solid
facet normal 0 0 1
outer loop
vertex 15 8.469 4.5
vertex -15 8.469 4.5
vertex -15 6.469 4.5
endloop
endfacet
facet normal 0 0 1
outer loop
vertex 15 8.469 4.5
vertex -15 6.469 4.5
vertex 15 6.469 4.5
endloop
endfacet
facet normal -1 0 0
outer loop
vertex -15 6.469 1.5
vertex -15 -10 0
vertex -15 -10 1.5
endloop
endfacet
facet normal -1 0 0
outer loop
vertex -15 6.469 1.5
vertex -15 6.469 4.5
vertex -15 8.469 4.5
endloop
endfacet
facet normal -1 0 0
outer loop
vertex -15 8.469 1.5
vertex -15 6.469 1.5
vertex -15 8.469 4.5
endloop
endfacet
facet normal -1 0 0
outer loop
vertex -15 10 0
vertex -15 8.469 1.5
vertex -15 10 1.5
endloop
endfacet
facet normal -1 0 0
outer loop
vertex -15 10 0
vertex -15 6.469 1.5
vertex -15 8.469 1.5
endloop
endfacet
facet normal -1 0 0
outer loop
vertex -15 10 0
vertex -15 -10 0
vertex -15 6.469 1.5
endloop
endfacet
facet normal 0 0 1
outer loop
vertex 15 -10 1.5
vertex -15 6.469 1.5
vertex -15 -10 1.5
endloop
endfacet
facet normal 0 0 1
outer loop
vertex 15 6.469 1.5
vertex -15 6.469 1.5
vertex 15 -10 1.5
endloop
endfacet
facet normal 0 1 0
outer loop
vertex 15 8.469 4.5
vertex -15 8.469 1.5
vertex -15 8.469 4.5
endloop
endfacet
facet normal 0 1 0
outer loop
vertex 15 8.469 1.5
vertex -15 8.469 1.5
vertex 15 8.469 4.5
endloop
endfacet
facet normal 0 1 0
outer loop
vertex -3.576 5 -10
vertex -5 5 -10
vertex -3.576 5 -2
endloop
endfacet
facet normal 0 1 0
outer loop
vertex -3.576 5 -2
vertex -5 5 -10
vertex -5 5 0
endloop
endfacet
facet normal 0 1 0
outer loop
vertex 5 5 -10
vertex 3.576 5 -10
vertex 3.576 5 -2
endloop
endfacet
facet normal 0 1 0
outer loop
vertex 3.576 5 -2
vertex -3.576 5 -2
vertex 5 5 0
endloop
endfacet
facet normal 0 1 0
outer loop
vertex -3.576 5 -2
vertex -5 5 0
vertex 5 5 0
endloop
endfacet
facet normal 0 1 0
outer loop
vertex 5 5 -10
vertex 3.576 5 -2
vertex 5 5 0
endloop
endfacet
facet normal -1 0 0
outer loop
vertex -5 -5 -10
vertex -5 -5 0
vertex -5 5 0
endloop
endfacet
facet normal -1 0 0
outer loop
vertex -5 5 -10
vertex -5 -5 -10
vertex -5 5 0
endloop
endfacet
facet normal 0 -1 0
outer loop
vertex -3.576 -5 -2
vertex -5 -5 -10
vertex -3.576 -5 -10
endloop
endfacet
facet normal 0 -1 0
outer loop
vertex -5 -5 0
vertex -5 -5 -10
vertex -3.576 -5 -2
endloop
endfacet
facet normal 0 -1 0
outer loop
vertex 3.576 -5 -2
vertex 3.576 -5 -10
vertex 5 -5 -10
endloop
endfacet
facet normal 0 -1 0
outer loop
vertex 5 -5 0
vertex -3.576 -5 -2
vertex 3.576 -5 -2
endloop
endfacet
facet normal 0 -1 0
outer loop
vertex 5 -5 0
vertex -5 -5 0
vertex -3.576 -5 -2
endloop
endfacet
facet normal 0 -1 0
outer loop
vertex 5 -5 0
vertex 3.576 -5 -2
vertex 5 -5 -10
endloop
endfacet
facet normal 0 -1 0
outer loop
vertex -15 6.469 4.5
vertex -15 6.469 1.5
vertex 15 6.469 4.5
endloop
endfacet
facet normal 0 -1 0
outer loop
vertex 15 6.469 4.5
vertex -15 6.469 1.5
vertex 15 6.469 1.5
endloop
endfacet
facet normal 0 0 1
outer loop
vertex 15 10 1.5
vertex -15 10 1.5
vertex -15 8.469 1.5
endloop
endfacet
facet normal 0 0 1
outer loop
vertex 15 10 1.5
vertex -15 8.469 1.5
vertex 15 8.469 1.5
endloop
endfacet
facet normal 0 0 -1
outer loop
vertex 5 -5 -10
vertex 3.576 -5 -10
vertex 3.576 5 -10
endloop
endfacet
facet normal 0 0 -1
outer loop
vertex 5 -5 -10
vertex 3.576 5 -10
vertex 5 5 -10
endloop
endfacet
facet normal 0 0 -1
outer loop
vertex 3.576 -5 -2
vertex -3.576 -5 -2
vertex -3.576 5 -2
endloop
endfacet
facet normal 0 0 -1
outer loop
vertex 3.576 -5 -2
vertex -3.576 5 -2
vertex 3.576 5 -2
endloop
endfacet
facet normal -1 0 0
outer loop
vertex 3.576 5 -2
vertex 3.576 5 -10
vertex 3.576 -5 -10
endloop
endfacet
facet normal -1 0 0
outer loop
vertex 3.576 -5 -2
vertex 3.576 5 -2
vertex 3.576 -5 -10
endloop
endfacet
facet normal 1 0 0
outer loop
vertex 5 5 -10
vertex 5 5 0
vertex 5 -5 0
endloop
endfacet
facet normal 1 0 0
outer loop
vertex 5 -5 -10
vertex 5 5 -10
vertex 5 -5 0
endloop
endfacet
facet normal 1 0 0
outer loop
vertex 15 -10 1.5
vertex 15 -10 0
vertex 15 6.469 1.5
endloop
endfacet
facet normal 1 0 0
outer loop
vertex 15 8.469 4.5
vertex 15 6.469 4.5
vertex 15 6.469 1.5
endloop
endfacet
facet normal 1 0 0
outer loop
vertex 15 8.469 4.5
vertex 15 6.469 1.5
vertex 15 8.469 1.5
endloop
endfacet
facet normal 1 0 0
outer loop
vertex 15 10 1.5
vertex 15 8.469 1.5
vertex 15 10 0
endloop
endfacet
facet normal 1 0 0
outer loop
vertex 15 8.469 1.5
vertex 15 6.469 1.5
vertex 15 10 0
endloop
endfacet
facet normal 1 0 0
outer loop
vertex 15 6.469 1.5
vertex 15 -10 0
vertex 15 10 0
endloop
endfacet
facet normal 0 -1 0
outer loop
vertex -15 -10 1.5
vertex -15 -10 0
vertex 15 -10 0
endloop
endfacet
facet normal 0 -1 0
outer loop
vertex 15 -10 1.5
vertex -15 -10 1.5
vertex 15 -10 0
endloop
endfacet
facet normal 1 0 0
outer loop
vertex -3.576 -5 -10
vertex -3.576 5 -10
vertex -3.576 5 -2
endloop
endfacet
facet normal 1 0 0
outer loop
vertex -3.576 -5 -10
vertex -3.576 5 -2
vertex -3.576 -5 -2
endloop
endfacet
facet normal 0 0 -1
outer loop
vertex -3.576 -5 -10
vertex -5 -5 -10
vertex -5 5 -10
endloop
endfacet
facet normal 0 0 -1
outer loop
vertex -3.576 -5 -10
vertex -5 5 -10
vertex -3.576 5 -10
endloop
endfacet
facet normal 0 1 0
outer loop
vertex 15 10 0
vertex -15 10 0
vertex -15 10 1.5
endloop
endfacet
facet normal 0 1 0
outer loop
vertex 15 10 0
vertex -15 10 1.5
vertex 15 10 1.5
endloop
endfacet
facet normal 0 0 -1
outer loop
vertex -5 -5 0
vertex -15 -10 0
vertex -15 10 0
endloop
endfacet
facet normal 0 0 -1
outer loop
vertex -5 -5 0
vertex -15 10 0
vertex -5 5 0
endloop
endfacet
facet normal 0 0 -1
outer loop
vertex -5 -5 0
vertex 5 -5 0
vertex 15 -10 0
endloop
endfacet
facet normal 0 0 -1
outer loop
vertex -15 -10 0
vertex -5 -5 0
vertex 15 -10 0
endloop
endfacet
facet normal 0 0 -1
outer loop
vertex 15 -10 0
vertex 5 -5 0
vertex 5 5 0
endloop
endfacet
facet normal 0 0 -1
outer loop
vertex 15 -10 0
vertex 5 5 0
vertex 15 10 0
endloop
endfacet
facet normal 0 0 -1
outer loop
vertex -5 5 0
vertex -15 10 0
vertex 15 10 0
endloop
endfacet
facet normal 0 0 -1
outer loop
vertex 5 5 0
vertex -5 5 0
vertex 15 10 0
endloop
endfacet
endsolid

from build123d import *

# Parameters (mm, degrees)
F0_W     = 30
F0_H     = 20
F1_DEPTH = 1.5
F2_W     = 30
F2_H     = 2
F3_DEPTH = 3
F4_W     = 10
F4_H     = 5
F5_DEPTH = 10
F6_W     = 7.152542
F6_H     = 10
F7_DEPTH = 8


with BuildPart() as f1:
    # F0 (on Top) → F1 (new body)
    with BuildSketch(Plane.XY):
        Rectangle(F0_W, F0_H)
    extrude(amount=F1_DEPTH)

    # F2 (on face) → F3 (join)
    with BuildSketch(Plane.XY.offset(1.5)):
        with Locations((0, 7.468739)):
            Rectangle(F2_W, F2_H)
    extrude(amount=F3_DEPTH)

    # F4 (on face) → F5 (join)
    with BuildSketch(Plane(origin=(0, 0, 0), x_dir=(1, 0, 0), z_dir=(0, 0, -1))):
        with Locations((0, 2.5)):
            Rectangle(F4_W, F4_H)
        with Locations((0, -2.5)):
            Rectangle(F4_W, F4_H)
    extrude(amount=F5_DEPTH)

    # F6 (on face) → F7 (cut)
    with BuildSketch(Plane(origin=(0, 0, -10), x_dir=(1, 0, 0), z_dir=(0, 0, -1))):
        Rectangle(F6_W, F6_H)
    extrude(amount=-F7_DEPTH, mode=Mode.SUBTRACT)


solid = f1.part
